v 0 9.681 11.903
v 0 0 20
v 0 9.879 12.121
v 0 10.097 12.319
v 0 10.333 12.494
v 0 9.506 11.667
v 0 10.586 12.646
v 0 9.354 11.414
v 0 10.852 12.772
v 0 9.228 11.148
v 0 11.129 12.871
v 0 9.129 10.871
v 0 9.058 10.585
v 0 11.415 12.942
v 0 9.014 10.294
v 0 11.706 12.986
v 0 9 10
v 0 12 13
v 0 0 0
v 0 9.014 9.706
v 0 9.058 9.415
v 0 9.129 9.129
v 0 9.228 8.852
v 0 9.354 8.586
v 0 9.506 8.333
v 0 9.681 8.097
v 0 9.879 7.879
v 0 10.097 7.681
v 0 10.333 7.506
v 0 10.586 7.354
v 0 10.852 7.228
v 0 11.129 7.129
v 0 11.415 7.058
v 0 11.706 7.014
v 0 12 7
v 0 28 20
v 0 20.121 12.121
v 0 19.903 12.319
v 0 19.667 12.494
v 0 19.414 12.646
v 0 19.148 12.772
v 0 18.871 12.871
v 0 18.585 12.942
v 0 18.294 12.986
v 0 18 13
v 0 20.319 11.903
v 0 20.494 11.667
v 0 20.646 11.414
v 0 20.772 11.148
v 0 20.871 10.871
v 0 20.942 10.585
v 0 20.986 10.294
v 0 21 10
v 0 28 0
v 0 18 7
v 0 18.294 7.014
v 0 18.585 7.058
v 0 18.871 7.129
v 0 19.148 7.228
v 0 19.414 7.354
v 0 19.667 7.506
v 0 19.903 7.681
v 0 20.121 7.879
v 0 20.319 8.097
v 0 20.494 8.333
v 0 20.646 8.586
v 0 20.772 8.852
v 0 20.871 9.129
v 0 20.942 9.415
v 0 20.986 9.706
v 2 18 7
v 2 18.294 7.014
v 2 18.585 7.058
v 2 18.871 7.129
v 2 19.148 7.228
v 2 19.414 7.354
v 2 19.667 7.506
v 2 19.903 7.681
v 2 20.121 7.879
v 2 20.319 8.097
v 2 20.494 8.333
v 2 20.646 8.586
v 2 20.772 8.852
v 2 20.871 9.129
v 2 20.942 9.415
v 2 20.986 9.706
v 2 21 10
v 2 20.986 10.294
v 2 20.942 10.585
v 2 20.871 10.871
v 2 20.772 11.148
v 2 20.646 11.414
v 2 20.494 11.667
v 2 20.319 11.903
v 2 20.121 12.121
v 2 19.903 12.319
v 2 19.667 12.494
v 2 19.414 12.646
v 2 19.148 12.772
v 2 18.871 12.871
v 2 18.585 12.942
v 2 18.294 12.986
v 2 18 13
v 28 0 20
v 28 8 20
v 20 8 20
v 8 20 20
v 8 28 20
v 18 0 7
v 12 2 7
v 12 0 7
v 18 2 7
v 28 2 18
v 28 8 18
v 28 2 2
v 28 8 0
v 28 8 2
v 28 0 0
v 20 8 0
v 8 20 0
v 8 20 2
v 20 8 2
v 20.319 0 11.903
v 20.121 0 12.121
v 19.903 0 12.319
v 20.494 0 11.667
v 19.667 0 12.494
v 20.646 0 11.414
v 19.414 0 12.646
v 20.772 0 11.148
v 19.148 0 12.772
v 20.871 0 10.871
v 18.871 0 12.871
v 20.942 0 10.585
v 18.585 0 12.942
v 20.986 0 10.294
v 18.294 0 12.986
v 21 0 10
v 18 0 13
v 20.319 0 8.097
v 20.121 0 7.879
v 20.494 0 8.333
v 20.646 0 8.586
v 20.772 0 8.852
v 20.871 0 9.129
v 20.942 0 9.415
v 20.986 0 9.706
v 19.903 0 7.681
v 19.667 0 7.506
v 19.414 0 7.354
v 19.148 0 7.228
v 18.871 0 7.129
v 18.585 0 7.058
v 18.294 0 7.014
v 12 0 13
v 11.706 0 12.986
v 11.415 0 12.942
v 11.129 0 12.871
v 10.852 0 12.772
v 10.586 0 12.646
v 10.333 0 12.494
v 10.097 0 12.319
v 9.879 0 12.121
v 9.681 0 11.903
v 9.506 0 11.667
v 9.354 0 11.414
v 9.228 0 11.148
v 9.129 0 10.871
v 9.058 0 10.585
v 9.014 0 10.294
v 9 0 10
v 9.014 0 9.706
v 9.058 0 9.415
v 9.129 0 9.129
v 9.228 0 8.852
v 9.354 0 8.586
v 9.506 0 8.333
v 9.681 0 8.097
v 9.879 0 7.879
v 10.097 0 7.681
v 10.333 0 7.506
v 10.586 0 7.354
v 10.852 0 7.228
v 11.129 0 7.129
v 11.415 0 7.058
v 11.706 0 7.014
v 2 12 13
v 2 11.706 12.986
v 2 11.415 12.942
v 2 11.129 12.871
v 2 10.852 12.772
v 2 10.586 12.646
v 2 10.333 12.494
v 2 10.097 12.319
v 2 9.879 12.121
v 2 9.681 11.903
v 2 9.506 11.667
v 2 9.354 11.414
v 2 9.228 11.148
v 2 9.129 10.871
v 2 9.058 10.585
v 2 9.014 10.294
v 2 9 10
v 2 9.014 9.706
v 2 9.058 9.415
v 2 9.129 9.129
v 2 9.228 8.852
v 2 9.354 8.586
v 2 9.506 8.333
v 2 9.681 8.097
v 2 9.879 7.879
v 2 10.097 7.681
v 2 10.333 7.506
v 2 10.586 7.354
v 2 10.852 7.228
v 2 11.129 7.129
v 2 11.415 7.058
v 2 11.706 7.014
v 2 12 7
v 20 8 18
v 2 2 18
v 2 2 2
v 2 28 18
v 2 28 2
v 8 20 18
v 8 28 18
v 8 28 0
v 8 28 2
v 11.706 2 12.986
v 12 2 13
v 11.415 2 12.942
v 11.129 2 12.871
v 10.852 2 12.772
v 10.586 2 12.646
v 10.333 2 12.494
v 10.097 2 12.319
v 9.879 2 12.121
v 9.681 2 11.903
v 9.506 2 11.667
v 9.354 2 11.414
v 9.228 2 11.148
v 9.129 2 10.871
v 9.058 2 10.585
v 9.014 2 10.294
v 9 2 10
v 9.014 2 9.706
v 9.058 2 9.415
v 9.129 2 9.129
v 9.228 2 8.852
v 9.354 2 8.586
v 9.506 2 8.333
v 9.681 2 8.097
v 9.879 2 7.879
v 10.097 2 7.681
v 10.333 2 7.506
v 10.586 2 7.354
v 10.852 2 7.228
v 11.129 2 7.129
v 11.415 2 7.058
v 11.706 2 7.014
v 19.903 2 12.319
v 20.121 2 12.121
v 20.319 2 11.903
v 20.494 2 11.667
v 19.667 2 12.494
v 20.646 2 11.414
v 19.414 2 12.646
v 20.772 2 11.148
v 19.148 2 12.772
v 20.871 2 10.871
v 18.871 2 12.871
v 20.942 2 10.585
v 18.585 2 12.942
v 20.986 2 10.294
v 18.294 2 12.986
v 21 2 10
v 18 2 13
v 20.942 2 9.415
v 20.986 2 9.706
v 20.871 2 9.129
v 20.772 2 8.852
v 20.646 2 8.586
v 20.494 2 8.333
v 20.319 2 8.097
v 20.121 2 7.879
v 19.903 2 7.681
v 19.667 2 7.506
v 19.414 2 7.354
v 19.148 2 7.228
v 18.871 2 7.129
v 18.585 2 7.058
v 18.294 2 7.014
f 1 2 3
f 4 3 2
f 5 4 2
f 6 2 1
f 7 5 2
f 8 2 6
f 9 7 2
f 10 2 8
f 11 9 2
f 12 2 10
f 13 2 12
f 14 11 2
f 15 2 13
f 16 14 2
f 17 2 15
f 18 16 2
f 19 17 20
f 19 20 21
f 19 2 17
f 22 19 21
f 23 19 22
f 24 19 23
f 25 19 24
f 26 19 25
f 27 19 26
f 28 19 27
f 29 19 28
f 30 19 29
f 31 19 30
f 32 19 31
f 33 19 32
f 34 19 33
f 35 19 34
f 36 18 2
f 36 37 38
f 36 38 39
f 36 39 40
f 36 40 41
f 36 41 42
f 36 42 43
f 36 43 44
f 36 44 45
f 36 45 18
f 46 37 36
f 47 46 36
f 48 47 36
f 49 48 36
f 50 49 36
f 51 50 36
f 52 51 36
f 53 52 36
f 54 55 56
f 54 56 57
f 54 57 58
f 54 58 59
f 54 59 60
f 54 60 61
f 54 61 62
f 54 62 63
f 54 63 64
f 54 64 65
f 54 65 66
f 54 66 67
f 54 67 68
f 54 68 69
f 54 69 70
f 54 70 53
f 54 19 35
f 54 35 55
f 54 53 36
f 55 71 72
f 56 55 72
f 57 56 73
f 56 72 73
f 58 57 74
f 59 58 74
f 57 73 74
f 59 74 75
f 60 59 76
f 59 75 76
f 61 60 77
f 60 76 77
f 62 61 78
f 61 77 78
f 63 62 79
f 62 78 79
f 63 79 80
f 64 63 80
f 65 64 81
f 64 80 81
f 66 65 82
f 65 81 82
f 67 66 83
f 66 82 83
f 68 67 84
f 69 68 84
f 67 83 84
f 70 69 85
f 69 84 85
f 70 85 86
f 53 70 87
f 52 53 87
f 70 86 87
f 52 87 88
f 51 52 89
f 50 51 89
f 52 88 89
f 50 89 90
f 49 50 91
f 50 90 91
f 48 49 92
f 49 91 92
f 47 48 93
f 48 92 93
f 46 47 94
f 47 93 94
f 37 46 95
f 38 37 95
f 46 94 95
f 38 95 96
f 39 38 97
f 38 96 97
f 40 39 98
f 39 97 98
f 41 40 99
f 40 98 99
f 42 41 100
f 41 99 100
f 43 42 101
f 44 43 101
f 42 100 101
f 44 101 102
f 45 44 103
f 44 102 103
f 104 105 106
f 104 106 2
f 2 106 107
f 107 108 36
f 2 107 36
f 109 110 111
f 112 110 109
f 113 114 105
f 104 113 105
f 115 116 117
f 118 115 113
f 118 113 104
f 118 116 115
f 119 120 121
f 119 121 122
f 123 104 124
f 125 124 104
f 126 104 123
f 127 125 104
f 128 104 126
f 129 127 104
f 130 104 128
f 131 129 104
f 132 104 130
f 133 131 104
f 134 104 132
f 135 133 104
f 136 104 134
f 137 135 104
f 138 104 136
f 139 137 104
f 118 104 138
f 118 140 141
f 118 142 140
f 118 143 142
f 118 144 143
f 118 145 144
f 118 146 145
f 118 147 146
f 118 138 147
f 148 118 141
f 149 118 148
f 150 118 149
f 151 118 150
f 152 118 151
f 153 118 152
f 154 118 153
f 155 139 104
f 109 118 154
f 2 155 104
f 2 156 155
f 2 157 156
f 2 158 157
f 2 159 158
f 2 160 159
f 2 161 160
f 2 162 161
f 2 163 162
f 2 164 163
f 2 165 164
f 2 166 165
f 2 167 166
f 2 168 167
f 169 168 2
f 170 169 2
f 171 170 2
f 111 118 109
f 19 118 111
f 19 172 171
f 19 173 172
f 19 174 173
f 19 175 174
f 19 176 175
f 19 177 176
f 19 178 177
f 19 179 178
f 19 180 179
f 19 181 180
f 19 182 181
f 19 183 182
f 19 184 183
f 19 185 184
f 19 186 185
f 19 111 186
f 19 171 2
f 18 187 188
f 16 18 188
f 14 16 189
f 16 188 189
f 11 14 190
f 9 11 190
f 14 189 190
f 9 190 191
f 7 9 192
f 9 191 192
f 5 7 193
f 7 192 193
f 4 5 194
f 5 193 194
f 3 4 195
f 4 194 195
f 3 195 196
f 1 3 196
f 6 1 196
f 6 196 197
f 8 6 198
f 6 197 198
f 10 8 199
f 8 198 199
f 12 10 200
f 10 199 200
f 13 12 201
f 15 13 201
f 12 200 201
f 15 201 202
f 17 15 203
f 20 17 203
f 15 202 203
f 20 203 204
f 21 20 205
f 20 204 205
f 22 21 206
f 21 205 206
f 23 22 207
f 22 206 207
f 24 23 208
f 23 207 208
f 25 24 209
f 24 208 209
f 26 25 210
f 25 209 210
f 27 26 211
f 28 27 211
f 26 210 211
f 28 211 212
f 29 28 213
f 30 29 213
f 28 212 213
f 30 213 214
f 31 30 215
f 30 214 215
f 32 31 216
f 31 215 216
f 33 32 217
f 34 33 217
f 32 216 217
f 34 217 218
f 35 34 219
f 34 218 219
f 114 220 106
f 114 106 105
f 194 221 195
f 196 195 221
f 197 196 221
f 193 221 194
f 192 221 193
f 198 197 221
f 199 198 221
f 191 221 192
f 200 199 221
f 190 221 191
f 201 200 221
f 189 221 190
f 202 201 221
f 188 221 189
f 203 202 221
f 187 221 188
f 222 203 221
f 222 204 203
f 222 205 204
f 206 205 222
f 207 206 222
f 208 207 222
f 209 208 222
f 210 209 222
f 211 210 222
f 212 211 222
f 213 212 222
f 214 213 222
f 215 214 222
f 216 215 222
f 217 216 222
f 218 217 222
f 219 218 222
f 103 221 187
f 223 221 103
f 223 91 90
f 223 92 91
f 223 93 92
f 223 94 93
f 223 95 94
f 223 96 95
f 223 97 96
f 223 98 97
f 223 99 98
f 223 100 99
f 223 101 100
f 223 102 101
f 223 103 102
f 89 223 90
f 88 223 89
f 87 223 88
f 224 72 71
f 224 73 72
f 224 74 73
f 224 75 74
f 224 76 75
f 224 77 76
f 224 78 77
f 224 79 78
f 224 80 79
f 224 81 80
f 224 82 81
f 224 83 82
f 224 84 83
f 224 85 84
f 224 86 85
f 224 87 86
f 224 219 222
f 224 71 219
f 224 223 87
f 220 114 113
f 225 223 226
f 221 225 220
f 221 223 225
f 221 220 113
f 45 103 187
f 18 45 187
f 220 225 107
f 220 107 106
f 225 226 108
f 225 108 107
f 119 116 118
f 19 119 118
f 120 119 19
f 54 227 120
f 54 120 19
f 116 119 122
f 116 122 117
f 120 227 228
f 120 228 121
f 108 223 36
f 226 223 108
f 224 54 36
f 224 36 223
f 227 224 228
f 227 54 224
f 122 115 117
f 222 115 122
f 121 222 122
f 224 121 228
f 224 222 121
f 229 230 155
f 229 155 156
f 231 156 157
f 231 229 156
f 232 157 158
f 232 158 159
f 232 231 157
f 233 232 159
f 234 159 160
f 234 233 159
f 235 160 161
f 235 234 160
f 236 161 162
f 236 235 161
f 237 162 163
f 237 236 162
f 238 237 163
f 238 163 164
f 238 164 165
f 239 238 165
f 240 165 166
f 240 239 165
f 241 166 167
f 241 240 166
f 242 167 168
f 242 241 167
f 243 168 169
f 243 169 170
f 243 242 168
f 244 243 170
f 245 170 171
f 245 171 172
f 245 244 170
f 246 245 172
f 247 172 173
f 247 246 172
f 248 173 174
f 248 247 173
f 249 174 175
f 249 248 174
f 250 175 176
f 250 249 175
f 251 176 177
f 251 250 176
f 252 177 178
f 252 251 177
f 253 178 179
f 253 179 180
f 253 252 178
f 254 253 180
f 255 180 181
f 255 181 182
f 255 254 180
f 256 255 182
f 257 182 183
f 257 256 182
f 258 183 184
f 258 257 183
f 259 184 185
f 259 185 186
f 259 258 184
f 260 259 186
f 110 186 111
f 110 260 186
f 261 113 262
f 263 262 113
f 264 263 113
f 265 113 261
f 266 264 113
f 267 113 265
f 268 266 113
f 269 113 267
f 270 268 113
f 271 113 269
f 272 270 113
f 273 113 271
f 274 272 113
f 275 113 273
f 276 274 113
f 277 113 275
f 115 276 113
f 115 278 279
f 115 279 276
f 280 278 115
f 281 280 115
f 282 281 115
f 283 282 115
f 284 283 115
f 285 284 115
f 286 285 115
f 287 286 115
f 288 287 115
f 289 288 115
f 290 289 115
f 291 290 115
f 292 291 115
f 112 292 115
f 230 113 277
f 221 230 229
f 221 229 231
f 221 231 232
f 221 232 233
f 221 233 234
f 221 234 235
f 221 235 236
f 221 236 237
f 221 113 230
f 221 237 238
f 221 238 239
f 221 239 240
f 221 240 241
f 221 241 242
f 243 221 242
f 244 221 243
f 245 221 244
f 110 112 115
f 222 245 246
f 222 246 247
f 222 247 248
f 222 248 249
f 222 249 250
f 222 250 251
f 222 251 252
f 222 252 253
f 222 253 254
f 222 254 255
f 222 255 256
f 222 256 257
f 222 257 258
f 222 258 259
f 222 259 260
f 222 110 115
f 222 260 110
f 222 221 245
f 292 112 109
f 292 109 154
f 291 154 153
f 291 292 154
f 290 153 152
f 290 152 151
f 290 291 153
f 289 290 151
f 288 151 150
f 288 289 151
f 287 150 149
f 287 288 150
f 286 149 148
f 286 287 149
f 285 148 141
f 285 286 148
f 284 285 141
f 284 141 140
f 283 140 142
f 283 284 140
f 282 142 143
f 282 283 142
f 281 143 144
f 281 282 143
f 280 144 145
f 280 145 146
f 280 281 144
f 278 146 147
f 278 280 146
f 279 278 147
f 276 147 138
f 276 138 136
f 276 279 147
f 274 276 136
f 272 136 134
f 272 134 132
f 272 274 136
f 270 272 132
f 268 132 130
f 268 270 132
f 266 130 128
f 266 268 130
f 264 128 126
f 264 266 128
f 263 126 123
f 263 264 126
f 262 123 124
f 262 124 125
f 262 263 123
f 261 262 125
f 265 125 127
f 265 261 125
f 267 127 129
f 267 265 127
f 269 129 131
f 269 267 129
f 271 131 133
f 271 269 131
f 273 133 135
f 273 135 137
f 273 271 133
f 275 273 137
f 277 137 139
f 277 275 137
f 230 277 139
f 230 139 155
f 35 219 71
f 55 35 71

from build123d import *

# Parameters (mm, degrees)
BOSS_EXTRUDE1_DEPTH = 20
CUT_EXTRUDE1_START  = -26
SKETCH2_W           = 16
SKETCH2_H           = 20
SKETCH2_H_2         = 6
CUT_EXTRUDE1_DEPTH  = 26
SKETCH3_R           = 3
CUT_EXTRUDE2_DEPTH  = 2.000000064


with BuildPart() as part:
    # Sketch1 → Boss-Extrude1 (new body)
    with BuildSketch(Plane.XY):
        Polygon((0, 0), (0, 28), (8, 28), (8, 20), (20, 8), (28, 8), (28, 0), align=None)
    extrude(amount=BOSS_EXTRUDE1_DEPTH)

    # Sketch2 → Cut-Extrude1 (cut)
    with BuildSketch(Plane(origin=(28, 0, 0), x_dir=(0, 0, -1), z_dir=(1, 0, 0)).offset(CUT_EXTRUDE1_START)):
        with Locations((-10, 18)):
            Rectangle(SKETCH2_W, SKETCH2_H)
        with Locations((-10, 5)):
            Rectangle(SKETCH2_W, SKETCH2_H_2)
    extrude(amount=CUT_EXTRUDE1_DEPTH, mode=Mode.SUBTRACT)

    # Sketch3 → Cut-Extrude2 (cut)
    with BuildSketch(Plane(origin=(2.000000064, 0, 0), x_dir=(0, 0, -1), z_dir=(1, 0, 0))):
        with Locations((-10, 18)):
            Circle(SKETCH3_R)
        with BuildLine():
            ThreePointArc((-10, 15), (-12.121320344, 15.878679656), (-13, 18))
            Line((-13, 18), (-13, 12))
            ThreePointArc((-13, 12), (-12.121320344, 14.121320344), (-10, 15))
        make_face()
        with BuildLine():
            Line((-7, 12), (-7, 18))
            ThreePointArc((-7, 18), (-7.878679656, 15.878679656), (-10, 15))
            ThreePointArc((-10, 15), (-7.878679656, 14.121320344), (-7, 12))
        make_face()
        with Locations((-10, 12)):
            Circle(SKETCH3_R)
    cut_extrude2 = extrude(amount=-CUT_EXTRUDE2_DEPTH, mode=Mode.SUBTRACT)

    # Mirror2: Cut-Extrude2 across plane
    add(cut_extrude2.mirror(Plane(origin=(0, 0, 0), x_dir=(0, 0, 1), z_dir=(0.7071067811865438, -0.7071067811865512, 0))), mode=Mode.SUBTRACT)


solid = part.part
